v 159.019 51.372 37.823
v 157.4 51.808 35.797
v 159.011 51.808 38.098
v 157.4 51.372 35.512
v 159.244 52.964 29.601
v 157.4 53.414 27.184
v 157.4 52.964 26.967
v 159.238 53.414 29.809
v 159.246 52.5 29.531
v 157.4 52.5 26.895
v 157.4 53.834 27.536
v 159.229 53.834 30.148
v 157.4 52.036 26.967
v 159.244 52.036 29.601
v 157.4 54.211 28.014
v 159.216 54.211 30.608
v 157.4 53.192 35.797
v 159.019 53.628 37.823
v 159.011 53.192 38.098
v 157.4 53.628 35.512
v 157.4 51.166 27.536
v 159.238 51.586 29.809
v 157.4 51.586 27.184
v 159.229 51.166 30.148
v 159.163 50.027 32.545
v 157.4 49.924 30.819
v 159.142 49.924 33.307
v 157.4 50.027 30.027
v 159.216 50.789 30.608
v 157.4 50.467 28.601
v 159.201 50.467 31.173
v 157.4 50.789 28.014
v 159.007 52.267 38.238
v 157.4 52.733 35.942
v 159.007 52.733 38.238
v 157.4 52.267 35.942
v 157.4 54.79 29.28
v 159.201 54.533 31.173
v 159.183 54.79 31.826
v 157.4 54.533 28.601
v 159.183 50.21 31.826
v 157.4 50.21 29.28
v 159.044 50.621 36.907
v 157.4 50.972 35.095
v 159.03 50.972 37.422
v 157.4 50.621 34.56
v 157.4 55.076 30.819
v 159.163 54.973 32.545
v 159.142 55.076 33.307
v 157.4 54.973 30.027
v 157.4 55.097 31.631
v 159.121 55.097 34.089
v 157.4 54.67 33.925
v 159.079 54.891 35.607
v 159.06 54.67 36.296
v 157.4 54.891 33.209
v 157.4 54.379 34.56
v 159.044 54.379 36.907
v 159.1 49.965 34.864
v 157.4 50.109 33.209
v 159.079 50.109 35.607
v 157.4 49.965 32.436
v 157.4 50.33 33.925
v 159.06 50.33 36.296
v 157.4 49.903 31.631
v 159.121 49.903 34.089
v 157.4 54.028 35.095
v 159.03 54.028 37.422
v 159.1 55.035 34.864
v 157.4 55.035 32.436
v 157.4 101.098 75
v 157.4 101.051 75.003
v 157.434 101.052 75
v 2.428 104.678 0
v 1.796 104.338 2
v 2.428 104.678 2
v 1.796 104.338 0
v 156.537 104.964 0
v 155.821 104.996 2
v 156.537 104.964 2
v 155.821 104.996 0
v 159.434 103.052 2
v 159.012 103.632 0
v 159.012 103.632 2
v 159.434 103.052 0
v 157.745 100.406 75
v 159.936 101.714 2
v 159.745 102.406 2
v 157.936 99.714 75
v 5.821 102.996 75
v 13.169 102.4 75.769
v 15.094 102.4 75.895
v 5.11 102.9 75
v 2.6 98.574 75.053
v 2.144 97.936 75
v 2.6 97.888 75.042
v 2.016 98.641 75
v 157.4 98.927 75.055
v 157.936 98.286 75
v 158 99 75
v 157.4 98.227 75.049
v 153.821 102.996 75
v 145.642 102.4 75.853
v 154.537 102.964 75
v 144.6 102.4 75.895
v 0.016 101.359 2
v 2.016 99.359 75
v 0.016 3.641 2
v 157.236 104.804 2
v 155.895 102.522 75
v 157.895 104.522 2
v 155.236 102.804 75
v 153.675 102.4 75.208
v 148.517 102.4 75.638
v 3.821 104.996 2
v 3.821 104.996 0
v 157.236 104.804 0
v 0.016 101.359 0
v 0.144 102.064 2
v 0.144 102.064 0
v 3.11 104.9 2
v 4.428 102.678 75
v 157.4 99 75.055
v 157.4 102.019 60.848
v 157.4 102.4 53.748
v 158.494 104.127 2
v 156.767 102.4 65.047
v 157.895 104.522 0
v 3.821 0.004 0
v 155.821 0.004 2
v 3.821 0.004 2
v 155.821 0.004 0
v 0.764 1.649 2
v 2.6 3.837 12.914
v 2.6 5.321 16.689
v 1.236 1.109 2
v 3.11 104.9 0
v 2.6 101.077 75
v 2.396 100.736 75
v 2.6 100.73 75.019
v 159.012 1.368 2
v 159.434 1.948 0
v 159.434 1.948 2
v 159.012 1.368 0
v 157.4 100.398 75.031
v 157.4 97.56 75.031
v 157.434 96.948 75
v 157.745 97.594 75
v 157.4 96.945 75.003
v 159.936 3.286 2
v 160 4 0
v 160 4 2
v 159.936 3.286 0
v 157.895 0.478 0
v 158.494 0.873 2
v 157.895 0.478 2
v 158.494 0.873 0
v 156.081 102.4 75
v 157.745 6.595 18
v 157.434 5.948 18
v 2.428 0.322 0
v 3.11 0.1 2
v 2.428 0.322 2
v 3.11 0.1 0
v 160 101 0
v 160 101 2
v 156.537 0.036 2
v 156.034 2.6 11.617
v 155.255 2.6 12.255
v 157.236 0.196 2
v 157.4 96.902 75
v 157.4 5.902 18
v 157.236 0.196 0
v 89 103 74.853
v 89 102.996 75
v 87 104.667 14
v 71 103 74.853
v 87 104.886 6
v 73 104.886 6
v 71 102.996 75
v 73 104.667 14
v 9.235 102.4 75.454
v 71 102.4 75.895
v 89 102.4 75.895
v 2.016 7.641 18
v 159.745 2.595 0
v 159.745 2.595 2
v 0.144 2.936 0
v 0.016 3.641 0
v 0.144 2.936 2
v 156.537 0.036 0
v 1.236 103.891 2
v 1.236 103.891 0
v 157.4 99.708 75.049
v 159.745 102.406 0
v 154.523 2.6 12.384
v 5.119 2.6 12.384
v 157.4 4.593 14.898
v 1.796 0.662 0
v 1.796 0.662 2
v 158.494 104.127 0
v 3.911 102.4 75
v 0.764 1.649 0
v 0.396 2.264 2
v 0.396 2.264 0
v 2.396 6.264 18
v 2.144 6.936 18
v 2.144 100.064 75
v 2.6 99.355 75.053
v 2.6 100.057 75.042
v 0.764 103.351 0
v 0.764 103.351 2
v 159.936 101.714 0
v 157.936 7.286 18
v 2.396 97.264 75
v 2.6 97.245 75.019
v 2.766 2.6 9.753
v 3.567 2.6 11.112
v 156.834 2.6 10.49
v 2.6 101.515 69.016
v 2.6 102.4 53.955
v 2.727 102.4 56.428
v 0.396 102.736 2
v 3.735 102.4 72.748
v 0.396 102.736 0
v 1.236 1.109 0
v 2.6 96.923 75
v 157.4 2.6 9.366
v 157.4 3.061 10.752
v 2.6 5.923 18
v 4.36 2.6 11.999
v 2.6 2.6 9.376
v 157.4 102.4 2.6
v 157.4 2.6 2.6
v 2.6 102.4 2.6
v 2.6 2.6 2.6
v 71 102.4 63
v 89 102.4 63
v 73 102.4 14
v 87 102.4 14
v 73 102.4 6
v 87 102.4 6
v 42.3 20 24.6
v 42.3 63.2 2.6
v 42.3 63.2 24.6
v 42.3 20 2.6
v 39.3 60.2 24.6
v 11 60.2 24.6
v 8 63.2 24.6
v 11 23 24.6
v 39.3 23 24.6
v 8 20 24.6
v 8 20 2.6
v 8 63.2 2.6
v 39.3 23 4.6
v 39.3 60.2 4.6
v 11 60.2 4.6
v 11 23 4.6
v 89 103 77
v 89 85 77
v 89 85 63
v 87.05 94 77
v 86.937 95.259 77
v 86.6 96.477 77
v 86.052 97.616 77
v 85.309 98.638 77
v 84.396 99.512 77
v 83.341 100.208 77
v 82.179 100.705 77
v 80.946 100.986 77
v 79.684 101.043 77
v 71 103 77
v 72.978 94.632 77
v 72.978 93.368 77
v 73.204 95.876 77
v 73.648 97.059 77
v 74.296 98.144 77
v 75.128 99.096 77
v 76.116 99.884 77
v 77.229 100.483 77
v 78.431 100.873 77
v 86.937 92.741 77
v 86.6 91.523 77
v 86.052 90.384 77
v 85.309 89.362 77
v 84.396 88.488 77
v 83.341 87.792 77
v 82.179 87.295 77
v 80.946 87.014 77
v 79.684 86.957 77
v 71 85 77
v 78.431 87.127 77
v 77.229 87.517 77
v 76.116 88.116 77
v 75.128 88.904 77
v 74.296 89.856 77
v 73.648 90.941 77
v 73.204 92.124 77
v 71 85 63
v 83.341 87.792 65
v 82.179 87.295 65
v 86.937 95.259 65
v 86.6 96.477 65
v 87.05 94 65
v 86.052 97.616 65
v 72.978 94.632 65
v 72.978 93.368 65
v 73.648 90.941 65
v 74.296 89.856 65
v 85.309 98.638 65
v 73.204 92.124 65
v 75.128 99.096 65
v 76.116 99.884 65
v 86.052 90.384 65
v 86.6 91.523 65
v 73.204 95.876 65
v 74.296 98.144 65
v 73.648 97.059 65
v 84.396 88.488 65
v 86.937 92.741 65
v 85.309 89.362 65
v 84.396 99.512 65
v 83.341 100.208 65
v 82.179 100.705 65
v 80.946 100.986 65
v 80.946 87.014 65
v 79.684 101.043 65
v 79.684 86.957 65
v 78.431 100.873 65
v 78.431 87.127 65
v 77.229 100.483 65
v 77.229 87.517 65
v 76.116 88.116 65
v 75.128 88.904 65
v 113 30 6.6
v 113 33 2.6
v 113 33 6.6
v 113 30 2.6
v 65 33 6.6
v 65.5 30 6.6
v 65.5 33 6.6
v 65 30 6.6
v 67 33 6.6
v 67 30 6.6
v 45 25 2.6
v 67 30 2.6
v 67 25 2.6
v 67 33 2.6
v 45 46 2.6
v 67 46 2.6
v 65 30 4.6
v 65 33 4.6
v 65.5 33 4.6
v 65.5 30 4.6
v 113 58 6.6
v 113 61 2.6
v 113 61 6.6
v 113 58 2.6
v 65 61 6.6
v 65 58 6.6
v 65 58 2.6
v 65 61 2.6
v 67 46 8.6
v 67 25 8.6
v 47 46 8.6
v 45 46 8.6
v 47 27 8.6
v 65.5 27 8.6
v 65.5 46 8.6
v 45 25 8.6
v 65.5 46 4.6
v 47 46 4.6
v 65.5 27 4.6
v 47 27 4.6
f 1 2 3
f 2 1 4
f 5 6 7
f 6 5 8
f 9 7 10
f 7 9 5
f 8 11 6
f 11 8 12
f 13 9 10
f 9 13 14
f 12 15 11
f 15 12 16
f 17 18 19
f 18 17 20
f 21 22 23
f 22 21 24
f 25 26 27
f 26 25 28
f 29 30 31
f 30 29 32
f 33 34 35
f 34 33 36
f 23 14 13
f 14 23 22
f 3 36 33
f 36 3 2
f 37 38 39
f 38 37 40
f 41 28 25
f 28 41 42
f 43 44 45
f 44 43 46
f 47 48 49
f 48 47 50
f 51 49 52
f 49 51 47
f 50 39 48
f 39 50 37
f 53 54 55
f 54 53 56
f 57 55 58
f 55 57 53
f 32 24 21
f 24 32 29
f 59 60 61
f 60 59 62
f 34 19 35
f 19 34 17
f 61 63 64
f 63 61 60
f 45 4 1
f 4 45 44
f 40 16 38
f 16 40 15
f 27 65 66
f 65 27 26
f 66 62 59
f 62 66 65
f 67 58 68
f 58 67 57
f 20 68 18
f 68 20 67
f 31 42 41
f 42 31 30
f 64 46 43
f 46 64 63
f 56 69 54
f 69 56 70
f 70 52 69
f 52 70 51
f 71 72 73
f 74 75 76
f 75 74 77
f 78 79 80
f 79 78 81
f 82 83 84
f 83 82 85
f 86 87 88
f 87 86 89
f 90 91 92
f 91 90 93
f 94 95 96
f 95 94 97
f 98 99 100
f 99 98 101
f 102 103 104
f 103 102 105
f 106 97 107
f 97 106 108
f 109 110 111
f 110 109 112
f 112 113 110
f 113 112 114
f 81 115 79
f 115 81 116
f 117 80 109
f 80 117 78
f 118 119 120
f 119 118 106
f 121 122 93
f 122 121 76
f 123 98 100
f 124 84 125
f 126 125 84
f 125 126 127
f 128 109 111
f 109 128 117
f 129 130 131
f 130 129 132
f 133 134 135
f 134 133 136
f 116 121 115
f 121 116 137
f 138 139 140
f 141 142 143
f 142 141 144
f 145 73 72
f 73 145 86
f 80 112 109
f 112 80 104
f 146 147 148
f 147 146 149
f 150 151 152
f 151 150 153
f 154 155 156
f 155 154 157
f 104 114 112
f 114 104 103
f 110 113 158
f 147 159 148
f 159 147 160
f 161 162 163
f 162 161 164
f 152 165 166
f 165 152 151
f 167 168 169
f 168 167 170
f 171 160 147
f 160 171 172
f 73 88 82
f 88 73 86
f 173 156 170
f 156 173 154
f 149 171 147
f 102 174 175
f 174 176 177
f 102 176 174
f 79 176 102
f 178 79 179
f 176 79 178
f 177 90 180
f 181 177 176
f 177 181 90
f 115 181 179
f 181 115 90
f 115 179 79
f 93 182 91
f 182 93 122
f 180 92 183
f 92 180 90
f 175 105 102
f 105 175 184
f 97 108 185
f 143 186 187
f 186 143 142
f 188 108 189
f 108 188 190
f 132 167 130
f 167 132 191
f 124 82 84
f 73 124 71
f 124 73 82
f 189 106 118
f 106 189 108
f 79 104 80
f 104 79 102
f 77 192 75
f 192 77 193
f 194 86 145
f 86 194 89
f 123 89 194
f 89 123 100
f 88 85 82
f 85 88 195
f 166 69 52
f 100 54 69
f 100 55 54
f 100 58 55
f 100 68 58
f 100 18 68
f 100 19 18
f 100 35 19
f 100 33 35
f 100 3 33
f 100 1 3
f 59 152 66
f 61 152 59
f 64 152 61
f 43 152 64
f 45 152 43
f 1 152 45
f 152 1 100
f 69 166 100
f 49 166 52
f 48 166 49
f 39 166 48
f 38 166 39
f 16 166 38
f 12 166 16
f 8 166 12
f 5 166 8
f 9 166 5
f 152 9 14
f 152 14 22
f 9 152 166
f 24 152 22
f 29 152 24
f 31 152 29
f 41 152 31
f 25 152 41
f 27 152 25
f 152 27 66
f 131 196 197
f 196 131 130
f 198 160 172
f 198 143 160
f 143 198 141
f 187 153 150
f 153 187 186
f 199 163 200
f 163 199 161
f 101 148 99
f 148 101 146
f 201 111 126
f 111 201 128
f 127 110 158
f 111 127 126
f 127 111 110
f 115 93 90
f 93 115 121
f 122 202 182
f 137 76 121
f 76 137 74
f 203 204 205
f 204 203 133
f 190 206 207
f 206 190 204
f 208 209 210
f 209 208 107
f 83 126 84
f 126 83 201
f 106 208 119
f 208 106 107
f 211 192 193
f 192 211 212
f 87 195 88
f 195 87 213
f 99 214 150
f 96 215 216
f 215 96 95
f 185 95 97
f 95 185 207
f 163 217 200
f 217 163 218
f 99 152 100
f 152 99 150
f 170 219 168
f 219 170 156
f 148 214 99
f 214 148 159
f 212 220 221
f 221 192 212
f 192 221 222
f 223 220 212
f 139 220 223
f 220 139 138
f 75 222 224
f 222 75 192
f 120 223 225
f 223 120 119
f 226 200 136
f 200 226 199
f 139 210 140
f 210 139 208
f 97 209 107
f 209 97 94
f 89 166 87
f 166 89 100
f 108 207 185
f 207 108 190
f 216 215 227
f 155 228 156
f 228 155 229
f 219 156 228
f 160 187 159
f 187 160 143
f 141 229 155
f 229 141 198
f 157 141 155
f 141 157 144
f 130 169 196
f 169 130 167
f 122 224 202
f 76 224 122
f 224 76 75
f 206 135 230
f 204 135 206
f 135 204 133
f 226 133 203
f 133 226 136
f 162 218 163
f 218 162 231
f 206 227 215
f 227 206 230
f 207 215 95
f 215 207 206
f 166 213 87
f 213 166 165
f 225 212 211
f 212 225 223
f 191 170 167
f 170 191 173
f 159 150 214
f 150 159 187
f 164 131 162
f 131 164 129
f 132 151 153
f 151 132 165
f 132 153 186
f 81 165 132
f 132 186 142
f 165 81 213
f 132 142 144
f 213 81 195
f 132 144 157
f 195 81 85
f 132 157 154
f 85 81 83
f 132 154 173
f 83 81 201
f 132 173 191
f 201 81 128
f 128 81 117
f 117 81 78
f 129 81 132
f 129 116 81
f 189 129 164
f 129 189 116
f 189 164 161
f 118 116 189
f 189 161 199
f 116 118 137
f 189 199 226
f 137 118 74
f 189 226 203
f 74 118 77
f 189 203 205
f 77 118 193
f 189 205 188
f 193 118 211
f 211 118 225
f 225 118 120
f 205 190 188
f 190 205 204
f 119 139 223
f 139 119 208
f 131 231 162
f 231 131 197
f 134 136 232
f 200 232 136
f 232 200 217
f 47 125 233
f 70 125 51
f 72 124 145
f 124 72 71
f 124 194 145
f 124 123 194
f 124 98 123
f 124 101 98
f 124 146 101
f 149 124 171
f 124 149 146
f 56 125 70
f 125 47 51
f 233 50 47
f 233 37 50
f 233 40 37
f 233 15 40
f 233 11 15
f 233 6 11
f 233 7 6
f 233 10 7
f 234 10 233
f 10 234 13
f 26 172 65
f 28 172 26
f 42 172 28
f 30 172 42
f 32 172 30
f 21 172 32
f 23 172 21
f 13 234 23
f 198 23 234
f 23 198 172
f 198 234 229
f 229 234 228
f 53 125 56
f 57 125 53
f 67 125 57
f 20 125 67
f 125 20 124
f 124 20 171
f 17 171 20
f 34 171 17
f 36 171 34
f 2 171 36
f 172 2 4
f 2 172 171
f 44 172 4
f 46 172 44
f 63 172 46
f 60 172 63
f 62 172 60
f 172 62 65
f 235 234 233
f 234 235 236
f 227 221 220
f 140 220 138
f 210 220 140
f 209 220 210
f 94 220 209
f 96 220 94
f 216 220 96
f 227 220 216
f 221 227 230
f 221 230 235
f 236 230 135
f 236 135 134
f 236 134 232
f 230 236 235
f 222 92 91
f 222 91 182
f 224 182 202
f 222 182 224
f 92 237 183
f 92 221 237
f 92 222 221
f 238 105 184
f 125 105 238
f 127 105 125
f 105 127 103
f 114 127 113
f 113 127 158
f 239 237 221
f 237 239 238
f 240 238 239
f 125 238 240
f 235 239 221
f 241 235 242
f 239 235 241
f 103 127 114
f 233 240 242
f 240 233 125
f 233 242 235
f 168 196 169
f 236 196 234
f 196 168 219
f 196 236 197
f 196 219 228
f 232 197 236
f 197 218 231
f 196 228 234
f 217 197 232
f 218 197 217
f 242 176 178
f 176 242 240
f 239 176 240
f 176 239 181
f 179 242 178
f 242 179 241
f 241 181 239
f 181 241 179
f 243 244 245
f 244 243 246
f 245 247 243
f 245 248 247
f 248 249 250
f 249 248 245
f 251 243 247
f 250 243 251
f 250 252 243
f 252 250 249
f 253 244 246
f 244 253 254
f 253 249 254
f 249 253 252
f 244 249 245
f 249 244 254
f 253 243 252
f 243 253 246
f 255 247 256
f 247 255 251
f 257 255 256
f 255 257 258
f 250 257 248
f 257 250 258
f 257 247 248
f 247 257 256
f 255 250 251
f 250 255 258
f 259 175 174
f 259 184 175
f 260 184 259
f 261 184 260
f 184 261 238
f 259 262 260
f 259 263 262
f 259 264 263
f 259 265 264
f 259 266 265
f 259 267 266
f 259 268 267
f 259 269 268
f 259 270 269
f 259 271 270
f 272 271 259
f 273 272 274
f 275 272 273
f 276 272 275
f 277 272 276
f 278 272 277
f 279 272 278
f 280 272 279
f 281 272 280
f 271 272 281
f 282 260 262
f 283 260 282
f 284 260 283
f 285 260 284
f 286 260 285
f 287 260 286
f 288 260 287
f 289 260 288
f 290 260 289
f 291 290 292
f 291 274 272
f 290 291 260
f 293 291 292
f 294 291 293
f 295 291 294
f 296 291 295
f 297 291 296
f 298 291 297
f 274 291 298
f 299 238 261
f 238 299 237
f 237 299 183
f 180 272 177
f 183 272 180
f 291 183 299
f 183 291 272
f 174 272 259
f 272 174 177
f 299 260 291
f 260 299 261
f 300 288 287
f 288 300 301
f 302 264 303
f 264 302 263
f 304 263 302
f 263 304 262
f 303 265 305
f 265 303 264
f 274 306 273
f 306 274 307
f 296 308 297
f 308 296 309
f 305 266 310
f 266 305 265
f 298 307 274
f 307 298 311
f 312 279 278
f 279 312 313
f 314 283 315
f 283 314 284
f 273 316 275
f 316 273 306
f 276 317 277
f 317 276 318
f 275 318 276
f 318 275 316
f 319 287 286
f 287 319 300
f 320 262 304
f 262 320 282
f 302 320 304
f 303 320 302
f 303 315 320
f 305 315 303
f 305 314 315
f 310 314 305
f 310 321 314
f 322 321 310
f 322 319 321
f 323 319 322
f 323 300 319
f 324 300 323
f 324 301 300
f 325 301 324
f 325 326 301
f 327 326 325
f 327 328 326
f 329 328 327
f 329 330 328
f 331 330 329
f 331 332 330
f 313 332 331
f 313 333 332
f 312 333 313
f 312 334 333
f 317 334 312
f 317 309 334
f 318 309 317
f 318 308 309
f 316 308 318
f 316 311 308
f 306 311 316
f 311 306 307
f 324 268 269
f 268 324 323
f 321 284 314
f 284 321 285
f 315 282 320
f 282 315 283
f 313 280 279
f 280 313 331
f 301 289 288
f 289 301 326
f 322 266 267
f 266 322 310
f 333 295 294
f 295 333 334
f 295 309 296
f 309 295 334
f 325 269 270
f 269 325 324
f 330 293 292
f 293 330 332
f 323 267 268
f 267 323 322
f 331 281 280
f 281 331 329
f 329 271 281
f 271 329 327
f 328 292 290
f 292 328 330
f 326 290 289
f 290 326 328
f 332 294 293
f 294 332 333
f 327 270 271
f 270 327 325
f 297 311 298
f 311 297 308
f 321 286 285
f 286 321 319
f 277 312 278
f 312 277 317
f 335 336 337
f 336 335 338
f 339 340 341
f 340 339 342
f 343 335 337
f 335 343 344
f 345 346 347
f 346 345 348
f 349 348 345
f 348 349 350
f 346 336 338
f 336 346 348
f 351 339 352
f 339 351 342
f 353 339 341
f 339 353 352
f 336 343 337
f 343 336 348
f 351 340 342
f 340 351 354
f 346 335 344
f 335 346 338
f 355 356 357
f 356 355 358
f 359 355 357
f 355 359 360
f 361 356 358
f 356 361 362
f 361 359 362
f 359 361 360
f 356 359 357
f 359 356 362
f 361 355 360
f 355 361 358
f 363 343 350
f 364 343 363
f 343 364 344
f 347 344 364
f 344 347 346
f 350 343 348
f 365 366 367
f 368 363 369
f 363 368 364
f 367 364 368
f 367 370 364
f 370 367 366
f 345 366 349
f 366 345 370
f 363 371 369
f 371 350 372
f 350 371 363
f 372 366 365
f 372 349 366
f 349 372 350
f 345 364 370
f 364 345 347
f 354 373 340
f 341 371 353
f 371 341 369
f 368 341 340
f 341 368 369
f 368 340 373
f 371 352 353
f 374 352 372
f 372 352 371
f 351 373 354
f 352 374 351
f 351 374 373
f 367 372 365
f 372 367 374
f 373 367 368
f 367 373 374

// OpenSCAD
// =============================================================================
// J.A.R.V.I.S. - CONSOLE SATÉLITE DE MESA (LAYOUT DEFINITIVO & SIMPLIFICADO)
// =============================================================================
// Configuração Oficial:
//   - LADO ESQUERDO: Alto-falante 4Ω 3W (27.8 x 36.7 mm) c/ câmara selada e grelha
//   - CENTRO: Display TFT 4.0" Touch (Vidro: 93.4 x 60.8 mm | Furos: 101.5 x 54.0 mm)
//   - TOPO CENTRALIZADO: Microfone MEMS INMP441 (13.6 mm) c/ porta acústica frontal
//   - LADO DIREITO: Coldre integrado para a Stylus / Caneta Touch (87.0 x 4.8 mm)
//   - INTERIOR: Berço para ESP32-S3 DevKit e 1x Amplificador MAX98357A (Mono)
// =============================================================================

$fn = 35;

// --- FOLGAS E TOLERÂNCIAS FDM ---
folga = 0.5;
parede = 2.6;
angulo_tela = 55; // Inclinação ergonômica da tela (55°)

// --- DIMENSÕES DOS COMPONENTES (MEDIDAS REAIS) ---
tft_furo_x = 101.5;
tft_furo_y = 54.0;
tft_vidro_x = 93.4 + folga;
tft_vidro_y = 60.8 + folga;

falante_w = 27.8 + folga;
falante_l = 36.7 + folga;
falante_prof = 10.0;

mic_d = 13.6 + folga;
caneta_d = 5.2;
caneta_comp = 82.0;

// --- DIMENSÕES DO GABINETE ---
console_w = 160.0; // Largura total (Falante na esquerda + Tela no centro/direita)
console_d = 105.0; // Profundidade na mesa
console_h = 75.0;  // Altura traseira

// Posição da Tela no Console (Centralizada para a direita)
tela_pos_x = 95.0; 
tela_pos_y = 45.0;
tela_pos_z = console_h/2 - 2;

// =============================================================================
// GABINETE PRINCIPAL DO SATÉLITE
// =============================================================================

module console_satelite_simplificado() {
    difference() {
        // Bloco aerodinâmico externo chanfrado
        hull() {
            // Base inferior
            translate([4, 4, 0]) cylinder(r=4, h=2);
            translate([console_w - 4, 4, 0]) cylinder(r=4, h=2);
            translate([console_w - 4, console_d - 4, 0]) cylinder(r=4, h=2);
            translate([4, console_d - 4, 0]) cylinder(r=4, h=2);

            // Perfil superior inclinado
            translate([6, 8, 16]) cylinder(r=4, h=2);
            translate([console_w - 6, 8, 16]) cylinder(r=4, h=2);
            translate([console_w - 6, console_d - 6, console_h - 2]) cylinder(r=4, h=2);
            translate([6, console_d - 6, console_h - 2]) cylinder(r=4, h=2);

            // Torre/Cúpula superior centralizada para o Microfone
            translate([console_w/2 - 12, console_d - 14, console_h])
                cube([24, 8, 6]);
        }

        // Cavidade interna geral (ESP32-S3, MAX98357A, fiação)
        translate([parede, parede, parede])
            cube([console_w - (parede*2), console_d - (parede*2), console_h + 12]);

        // 1. ABERTURA E BEZEL DO DISPLAY TFT 4.0" TOUCH
        translate([tela_pos_x, tela_pos_y, tela_pos_z])
            rotate([angulo_tela - 90, 0, 0]) {
                // Janela visível do vidro
                cube([tft_vidro_x, tft_vidro_y, 25], center=true);

                // Furação M3 (101.5 x 54.0 mm)
                for (dx = [-tft_furo_x/2, tft_furo_x/2]) {
                    for (dy = [-tft_furo_y/2, tft_furo_y/2]) {
                        translate([dx, dy, -15])
                            cylinder(d=3.2, h=30);
                    }
                }
            }

        // 2. LADO ESQUERDO: GRELHA DO ALTO-FALANTE 4Ω 3W
        translate([24, 40, 32])
            rotate([angulo_tela - 90, 0, 0]) {
                // Abertura acústica e grelha futurista
                for (slot = [-4 : 4]) {
                    translate([0, slot * 4.2, 0])
                        cube([24.0, 2.0, 16], center=true);
                }
            }

        // 3. TOPO CENTRALIZADO: PÓRTICO ACÚSTICO DO MICROFONE INMP441
        translate([console_w/2, console_d - 10, console_h + 3])
            rotate([30, 0, 0])
                cylinder(d=2.6, h=16, center=true); // Orifício frontal de 2.6mm

        // 4. LADO DIREITO: COLDRE DA CANETA STYLUS TOUCH
        translate([console_w - 5, console_d/2, 28])
            rotate([0, 90 - angulo_tela, 0]) {
                cylinder(d=caneta_d, h=caneta_comp + 5);
                translate([-3, 0, caneta_comp - 15])
                    cube([6, 8.5, 20]);
            }

        // 5. TRASEIRA: SAÍDA USB-C
        translate([console_w/2, console_d - 1, 10])
            cube([14, parede + 2, 8], center=true);
    }
}

// Câmara acústica selada para o Alto-falante no lado esquerdo
module camara_acustica_esquerda() {
    translate([8, 20, parede]) {
        difference() {
            cube([falante_w + 6, falante_l + 6, 22]);
            translate([3, 3, 2])
                cube([falante_w, falante_l, 24]);
        }
    }
}

// Berço isolado para a PCB do Microfone INMP441 no topo central
module berco_microfone_topo() {
    translate([console_w/2 - 9, console_d - 20, console_h - 12]) {
        difference() {
            cube([18, 18, 14]);
            translate([9, 9, 2])
                cylinder(d=mic_d, h=16);
        }
    }
}

// Trilhos de apoio para ESP32-S3 e MAX98357A na base
module berco_eletronica_base() {
    // Guias do ESP32-S3
    translate([console_w/2 - 15, 30, parede]) {
        cube([48, 3, 4]);
        translate([0, 28, 0]) cube([48, 3, 4]);
    }

    // Trilho do amplificador MAX98357A
    translate([45, 25, parede]) {
        difference() {
            cube([22, 21, 6]);
            translate([2, 2, 2])
                cube([18.5, 19.5, 6]);
        }
    }
}

// =============================================================================
// MONTAGEM FINAL DO CONSOLE
// =============================================================================
union() {
    console_satelite_simplificado();
    camara_acustica_esquerda();
    berco_microfone_topo();
    berco_eletronica_base();
}
